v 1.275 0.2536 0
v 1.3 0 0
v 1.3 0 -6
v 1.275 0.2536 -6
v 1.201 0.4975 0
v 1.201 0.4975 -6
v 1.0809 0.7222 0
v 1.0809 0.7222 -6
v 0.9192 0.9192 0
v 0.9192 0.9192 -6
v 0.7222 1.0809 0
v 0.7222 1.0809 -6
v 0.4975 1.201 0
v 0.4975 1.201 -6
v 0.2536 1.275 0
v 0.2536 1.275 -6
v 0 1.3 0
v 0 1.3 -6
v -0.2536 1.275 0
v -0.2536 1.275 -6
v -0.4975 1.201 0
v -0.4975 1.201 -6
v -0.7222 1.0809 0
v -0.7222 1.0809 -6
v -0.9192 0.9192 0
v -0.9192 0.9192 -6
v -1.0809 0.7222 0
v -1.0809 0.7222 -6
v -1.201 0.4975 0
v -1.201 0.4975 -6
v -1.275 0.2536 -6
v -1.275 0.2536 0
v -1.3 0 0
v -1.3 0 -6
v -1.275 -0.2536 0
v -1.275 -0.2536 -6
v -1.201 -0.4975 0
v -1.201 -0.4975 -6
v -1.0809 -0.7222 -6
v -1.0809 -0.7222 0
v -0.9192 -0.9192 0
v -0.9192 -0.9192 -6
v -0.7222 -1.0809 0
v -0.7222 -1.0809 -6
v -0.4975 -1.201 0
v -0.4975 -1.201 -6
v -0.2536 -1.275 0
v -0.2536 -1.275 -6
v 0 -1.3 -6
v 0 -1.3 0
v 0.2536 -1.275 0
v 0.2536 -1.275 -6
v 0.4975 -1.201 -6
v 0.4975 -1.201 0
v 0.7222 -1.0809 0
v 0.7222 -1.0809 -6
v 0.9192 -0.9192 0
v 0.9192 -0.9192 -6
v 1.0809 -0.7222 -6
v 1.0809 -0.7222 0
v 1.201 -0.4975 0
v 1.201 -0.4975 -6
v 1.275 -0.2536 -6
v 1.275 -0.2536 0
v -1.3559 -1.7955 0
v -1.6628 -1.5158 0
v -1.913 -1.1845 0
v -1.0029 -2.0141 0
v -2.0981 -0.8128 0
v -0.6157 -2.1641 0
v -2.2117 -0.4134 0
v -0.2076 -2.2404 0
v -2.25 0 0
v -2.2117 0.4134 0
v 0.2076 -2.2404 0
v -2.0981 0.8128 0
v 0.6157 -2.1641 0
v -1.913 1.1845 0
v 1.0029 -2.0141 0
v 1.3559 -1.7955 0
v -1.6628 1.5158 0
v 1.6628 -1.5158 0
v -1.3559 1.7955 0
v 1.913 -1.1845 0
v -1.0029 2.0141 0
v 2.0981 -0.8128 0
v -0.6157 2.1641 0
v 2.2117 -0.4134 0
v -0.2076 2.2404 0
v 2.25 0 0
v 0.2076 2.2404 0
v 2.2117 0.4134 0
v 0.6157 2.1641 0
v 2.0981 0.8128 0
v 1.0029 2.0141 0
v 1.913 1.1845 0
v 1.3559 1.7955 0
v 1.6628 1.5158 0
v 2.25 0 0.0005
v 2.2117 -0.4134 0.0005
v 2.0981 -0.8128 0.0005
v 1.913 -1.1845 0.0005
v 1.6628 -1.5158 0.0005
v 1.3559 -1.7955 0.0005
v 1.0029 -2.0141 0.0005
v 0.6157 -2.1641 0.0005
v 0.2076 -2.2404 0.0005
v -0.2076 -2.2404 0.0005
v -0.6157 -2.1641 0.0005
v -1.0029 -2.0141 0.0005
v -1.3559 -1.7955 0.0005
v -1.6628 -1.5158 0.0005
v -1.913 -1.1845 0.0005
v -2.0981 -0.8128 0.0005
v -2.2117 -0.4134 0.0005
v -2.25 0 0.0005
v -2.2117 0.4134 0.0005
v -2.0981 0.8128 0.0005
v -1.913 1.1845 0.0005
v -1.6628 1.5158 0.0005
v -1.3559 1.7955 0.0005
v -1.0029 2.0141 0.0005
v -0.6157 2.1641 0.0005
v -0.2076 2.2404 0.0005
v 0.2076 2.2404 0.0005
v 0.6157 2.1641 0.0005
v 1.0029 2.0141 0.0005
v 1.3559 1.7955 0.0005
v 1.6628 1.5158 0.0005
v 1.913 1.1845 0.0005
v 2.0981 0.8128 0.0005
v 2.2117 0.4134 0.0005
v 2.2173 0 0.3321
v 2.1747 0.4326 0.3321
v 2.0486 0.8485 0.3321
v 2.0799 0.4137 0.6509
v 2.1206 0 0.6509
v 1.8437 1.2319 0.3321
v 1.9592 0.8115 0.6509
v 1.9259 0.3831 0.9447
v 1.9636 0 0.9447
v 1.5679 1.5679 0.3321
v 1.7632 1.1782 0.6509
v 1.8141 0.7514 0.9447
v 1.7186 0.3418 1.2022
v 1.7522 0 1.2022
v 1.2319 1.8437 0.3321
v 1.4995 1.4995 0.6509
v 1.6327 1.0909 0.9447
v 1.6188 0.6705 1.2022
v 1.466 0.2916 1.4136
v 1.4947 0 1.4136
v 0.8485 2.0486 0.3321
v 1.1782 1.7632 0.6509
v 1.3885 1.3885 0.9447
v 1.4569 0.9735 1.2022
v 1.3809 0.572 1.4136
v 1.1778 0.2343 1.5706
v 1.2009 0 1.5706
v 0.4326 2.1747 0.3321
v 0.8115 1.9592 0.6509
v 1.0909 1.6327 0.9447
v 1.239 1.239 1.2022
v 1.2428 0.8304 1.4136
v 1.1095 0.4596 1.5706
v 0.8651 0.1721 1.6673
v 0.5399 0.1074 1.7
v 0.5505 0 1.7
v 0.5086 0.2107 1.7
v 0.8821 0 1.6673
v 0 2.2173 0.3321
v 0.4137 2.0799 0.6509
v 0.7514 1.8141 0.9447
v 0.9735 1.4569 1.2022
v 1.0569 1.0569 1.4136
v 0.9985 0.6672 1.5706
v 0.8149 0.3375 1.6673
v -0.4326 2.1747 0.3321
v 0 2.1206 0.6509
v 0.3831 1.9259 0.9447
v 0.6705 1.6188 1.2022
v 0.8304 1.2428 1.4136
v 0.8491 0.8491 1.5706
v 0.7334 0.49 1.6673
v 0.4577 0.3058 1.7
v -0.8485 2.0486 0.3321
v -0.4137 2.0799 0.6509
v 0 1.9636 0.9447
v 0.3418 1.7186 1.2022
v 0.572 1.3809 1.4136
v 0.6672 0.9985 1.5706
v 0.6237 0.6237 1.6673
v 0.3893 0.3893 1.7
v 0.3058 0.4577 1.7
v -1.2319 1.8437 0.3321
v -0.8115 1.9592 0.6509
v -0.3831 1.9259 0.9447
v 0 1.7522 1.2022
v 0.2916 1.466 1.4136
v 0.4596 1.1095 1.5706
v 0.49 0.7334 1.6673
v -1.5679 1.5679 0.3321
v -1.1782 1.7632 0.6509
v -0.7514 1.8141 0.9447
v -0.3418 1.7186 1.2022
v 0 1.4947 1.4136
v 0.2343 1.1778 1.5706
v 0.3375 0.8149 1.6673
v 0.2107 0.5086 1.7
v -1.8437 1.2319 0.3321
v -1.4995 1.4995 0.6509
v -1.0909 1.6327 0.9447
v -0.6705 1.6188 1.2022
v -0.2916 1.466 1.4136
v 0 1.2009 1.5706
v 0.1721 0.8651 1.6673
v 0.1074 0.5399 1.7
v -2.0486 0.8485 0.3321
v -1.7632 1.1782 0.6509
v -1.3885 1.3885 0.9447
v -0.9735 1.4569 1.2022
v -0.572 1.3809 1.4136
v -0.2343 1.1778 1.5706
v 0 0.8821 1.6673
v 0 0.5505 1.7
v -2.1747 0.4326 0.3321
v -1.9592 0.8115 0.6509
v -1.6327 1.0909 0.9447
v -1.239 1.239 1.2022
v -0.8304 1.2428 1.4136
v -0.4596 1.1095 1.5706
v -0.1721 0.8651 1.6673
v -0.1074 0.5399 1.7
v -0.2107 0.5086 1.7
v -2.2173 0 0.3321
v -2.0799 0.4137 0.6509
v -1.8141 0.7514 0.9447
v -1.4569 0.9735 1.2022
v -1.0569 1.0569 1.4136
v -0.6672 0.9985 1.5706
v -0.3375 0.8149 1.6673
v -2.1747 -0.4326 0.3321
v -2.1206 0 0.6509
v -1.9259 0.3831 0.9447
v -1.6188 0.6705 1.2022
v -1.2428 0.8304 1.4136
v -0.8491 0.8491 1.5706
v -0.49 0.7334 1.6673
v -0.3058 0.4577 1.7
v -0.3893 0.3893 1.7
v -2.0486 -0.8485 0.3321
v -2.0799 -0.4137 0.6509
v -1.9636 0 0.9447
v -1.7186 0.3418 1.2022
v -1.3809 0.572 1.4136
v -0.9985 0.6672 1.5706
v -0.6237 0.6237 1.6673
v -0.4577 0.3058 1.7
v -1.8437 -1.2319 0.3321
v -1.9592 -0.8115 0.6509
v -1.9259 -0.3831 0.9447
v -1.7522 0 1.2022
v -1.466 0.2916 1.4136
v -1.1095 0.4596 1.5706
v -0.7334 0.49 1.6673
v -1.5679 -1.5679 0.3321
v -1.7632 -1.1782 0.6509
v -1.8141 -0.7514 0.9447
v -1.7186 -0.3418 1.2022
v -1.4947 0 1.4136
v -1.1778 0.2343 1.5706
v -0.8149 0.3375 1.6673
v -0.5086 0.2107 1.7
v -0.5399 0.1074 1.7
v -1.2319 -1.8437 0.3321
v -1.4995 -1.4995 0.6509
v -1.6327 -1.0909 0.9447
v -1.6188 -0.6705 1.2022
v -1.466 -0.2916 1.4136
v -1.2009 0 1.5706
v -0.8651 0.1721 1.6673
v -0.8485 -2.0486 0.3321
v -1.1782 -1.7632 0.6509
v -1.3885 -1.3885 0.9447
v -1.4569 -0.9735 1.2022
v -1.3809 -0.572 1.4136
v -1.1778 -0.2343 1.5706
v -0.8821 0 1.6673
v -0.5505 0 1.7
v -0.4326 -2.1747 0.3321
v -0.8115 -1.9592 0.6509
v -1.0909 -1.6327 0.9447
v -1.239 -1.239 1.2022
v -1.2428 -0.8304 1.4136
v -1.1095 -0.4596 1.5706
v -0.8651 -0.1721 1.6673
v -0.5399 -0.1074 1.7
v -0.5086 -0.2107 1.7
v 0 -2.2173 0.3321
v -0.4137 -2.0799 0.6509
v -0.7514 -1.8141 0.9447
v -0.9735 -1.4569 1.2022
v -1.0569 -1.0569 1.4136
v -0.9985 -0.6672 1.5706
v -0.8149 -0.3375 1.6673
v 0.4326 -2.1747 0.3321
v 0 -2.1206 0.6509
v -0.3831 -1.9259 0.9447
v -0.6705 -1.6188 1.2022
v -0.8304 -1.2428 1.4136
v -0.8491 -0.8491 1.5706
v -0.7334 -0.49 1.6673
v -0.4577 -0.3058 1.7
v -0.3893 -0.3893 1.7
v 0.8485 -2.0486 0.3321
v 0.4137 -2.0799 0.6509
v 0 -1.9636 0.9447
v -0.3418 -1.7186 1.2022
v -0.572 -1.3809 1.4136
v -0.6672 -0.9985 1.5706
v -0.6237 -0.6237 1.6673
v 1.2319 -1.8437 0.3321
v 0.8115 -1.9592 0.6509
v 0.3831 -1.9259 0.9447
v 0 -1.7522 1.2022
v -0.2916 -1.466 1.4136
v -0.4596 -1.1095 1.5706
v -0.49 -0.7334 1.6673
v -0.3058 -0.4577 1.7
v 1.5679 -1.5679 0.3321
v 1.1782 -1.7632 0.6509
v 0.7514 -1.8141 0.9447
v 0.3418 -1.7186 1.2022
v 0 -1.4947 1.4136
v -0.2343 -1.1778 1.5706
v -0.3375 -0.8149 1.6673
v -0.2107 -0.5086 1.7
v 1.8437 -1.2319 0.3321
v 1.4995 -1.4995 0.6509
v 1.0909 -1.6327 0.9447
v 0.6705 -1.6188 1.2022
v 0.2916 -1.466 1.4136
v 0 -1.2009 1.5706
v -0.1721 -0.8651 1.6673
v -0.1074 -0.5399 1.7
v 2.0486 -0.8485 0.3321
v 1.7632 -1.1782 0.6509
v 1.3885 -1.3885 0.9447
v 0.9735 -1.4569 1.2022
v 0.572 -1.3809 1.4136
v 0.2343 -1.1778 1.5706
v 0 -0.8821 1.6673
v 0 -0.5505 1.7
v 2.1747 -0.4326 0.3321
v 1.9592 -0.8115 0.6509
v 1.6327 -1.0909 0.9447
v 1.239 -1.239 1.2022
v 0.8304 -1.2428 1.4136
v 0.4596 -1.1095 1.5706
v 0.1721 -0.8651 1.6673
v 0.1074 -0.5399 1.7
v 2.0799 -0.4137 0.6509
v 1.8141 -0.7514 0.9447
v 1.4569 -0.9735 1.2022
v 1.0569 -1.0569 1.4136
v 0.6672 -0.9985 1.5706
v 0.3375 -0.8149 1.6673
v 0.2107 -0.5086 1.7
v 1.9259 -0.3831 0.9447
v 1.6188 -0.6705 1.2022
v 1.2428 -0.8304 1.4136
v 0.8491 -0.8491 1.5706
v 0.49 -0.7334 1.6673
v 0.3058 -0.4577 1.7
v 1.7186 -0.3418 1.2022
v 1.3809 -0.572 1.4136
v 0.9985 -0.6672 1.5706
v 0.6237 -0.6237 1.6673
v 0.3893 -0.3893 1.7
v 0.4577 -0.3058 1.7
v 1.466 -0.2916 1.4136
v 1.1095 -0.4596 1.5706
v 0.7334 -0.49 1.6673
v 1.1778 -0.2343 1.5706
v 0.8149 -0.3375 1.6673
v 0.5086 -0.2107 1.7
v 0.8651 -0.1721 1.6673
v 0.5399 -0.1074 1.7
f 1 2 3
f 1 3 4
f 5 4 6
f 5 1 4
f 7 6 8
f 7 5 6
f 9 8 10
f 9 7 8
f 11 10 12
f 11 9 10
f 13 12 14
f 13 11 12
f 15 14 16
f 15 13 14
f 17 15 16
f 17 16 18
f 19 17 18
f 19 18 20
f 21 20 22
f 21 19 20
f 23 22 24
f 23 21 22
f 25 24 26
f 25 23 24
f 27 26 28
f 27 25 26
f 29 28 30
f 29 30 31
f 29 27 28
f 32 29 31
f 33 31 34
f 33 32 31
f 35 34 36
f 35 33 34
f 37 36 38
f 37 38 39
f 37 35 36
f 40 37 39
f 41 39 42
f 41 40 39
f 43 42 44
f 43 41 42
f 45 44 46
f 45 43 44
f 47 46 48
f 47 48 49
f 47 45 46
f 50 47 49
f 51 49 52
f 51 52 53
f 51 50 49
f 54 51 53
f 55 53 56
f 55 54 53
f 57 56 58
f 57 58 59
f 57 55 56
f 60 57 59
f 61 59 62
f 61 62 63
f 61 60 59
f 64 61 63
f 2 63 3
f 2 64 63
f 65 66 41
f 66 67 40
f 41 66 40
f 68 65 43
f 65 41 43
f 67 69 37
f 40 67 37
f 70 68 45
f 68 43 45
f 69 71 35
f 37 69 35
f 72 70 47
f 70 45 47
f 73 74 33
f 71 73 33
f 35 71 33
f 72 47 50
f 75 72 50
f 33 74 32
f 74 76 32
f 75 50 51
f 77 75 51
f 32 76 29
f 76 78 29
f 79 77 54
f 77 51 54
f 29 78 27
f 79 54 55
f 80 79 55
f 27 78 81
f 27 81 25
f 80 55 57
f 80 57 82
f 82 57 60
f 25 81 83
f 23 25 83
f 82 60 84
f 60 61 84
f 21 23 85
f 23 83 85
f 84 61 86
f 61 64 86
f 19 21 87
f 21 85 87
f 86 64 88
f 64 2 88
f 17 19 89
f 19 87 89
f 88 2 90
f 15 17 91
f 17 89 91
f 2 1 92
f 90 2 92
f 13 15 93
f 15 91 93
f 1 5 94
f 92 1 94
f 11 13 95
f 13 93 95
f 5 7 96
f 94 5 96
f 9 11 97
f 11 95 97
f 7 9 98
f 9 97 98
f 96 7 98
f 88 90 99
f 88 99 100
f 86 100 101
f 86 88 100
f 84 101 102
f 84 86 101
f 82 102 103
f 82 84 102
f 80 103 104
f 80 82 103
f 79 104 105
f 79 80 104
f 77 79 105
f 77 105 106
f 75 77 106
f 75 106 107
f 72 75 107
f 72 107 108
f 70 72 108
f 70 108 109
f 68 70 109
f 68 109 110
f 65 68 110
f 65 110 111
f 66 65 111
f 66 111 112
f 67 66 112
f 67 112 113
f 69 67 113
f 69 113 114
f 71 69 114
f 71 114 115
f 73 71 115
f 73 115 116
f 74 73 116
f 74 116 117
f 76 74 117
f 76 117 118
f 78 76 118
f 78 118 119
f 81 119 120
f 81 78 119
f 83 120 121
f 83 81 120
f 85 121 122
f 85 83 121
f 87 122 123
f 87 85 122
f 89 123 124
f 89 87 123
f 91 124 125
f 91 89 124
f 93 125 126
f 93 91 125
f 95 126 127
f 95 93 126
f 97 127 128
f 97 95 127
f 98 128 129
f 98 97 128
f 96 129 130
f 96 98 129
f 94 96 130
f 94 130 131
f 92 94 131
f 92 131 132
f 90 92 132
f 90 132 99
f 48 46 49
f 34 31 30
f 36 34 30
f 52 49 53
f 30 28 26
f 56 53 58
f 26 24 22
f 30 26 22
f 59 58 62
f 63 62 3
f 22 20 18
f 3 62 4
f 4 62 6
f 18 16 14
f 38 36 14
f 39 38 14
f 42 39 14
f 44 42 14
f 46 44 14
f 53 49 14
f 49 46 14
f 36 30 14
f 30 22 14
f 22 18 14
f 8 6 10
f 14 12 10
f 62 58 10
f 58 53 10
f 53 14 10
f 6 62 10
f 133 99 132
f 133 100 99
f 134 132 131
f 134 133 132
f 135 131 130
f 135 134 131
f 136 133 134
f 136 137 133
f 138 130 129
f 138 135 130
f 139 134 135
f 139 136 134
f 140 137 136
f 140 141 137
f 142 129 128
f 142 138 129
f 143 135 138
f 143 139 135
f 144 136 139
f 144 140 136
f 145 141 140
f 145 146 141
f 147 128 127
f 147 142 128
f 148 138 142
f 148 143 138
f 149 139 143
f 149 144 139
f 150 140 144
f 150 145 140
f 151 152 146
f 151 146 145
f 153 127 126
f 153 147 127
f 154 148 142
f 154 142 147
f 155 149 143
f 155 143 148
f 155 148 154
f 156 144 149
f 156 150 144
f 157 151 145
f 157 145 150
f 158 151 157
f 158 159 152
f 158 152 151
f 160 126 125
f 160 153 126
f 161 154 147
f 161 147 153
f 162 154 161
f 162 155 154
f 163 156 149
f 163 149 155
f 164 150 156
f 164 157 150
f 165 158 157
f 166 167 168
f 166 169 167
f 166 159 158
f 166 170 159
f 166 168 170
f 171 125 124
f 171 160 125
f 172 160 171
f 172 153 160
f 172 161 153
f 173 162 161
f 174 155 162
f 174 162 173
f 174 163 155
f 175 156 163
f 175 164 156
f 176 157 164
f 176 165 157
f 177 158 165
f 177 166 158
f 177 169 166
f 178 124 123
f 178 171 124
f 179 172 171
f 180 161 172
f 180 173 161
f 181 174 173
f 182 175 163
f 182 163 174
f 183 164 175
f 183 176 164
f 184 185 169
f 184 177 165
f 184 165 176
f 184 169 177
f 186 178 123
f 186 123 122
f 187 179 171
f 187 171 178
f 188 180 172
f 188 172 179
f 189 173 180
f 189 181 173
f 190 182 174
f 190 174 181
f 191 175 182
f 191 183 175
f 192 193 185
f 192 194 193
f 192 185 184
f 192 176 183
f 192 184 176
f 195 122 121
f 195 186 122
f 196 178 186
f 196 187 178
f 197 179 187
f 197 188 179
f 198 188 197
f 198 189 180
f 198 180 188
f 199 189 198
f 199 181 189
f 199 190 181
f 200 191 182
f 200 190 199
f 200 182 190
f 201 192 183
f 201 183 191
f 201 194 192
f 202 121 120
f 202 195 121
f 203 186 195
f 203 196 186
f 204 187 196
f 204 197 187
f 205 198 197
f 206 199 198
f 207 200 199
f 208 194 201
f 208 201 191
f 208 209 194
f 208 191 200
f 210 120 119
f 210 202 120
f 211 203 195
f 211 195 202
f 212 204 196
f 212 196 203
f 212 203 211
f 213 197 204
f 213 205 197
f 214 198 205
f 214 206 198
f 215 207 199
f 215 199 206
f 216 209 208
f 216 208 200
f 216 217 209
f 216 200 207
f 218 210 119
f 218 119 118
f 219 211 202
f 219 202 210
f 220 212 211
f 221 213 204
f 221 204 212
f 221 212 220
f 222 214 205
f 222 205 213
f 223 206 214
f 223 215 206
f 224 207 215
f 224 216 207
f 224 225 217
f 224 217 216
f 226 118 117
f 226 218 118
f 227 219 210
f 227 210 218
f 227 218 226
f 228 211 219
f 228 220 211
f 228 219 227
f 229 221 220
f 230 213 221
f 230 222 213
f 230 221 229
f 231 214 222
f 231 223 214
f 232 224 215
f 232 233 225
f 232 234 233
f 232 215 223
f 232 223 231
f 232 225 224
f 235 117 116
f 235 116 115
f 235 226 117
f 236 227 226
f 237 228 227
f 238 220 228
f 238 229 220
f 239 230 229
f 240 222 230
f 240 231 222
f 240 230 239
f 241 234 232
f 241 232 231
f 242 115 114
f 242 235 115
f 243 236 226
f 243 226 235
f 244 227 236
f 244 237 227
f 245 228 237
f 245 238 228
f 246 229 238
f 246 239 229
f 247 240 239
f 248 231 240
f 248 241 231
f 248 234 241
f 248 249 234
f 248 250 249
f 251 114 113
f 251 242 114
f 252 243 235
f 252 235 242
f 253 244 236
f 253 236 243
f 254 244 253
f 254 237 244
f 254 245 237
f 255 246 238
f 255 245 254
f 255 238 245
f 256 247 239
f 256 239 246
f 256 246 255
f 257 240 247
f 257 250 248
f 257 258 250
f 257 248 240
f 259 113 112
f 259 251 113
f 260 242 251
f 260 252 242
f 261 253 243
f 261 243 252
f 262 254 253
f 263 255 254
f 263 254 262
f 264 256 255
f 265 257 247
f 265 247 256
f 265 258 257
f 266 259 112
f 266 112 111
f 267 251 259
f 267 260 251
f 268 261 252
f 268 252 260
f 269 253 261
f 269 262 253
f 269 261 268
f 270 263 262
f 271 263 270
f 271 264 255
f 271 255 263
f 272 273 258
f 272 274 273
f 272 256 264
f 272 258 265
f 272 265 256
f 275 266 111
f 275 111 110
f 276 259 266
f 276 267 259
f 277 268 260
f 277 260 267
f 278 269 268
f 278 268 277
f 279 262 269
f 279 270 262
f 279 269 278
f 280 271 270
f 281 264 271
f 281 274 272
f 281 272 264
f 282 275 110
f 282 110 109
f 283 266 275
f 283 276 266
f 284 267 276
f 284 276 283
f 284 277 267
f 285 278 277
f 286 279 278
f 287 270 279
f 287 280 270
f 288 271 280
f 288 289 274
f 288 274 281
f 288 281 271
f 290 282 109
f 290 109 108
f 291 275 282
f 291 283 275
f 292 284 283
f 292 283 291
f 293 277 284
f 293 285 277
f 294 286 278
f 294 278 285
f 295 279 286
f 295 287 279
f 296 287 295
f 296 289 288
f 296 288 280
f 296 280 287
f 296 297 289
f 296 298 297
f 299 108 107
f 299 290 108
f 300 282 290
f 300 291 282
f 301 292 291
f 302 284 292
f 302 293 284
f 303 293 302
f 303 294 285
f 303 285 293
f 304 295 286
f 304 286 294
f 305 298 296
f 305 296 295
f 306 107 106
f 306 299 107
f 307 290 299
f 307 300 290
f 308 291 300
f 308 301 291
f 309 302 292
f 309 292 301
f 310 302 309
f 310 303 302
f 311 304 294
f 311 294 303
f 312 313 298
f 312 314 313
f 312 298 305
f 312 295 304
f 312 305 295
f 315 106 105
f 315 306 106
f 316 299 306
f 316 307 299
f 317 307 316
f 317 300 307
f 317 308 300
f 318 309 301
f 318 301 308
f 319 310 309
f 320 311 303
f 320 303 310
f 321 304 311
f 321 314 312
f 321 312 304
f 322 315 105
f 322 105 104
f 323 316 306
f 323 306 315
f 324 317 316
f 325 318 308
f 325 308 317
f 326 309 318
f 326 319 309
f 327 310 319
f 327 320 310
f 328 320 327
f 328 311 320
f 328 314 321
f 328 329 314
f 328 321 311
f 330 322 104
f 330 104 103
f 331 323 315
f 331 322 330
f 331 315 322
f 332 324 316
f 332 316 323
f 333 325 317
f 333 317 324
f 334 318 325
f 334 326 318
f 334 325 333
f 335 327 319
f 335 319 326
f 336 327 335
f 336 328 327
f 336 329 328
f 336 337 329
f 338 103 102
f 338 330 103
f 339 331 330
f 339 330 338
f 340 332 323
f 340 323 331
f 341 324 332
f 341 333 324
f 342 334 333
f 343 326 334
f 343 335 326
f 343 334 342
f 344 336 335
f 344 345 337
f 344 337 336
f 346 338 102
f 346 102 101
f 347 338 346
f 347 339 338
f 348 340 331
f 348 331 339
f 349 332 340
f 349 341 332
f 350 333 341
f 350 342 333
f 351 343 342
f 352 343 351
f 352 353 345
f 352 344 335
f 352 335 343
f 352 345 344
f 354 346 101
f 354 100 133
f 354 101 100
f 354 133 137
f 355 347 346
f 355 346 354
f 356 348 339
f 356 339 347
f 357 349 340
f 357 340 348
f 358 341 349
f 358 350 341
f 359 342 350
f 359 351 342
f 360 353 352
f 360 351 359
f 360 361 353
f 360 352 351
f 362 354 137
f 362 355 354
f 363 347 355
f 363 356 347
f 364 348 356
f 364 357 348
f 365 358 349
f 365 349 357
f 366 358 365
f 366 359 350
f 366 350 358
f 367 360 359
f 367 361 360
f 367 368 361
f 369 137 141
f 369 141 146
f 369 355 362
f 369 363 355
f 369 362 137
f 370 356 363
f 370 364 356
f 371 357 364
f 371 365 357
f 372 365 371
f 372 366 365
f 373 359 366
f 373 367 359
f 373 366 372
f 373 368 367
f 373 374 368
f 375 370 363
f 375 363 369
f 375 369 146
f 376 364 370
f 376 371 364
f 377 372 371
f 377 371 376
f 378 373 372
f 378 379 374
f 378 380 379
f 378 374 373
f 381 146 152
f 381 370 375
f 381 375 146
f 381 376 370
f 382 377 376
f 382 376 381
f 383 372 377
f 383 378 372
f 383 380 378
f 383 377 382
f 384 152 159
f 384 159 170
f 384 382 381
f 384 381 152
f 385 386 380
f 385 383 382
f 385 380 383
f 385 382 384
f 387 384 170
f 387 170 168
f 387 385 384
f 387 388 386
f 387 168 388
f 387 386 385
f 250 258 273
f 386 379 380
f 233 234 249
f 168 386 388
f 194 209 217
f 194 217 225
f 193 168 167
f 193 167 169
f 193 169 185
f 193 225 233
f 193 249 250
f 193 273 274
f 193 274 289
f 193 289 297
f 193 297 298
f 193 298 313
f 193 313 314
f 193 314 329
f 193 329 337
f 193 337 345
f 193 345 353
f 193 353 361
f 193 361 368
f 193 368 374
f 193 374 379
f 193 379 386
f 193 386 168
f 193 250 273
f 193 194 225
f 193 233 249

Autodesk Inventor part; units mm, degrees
ref_plane "YZ Plane" through (0, 0, 0) normal (1, 0, 0) x (0, 1, 0)
ref_plane "XZ Plane" through (0, 0, 0) normal (0, 1, 0) x (-1, 0, 0)
ref_plane "XY Plane" through (0, 0, 0) normal (0, 0, 1) x (1, 0, 0)
sketch "スケッチ1" plane through (0, 0, 0) normal (0, 0, 1) x (1, 0, 0)
  circle A0 centre (0, 0) radius 1.3
  dimension "d0" = 2.6
extrude "押し出し1" add sketch "スケッチ1" against normal blind 6
sketch "スケッチ2" plane through (0, 0, 0) normal (0, 0, 1) x (1, 0, 0)
  circle A0 centre (0, 0) radius 2.25
  dimension "d3" = 4.5
extrude "押し出し2" add sketch "スケッチ2" along normal blind 1.7
fillet "フィレット1" radius 1.7 1 edges at (-2.25, 0, 1.7)
thread "ねじ1" size "M2.6x0.45" class "6g" standard "ANSI Metric M Profile" full length
properties part number "ネジ鍋m2.6,06" material "鋼、高強度、低合金"
